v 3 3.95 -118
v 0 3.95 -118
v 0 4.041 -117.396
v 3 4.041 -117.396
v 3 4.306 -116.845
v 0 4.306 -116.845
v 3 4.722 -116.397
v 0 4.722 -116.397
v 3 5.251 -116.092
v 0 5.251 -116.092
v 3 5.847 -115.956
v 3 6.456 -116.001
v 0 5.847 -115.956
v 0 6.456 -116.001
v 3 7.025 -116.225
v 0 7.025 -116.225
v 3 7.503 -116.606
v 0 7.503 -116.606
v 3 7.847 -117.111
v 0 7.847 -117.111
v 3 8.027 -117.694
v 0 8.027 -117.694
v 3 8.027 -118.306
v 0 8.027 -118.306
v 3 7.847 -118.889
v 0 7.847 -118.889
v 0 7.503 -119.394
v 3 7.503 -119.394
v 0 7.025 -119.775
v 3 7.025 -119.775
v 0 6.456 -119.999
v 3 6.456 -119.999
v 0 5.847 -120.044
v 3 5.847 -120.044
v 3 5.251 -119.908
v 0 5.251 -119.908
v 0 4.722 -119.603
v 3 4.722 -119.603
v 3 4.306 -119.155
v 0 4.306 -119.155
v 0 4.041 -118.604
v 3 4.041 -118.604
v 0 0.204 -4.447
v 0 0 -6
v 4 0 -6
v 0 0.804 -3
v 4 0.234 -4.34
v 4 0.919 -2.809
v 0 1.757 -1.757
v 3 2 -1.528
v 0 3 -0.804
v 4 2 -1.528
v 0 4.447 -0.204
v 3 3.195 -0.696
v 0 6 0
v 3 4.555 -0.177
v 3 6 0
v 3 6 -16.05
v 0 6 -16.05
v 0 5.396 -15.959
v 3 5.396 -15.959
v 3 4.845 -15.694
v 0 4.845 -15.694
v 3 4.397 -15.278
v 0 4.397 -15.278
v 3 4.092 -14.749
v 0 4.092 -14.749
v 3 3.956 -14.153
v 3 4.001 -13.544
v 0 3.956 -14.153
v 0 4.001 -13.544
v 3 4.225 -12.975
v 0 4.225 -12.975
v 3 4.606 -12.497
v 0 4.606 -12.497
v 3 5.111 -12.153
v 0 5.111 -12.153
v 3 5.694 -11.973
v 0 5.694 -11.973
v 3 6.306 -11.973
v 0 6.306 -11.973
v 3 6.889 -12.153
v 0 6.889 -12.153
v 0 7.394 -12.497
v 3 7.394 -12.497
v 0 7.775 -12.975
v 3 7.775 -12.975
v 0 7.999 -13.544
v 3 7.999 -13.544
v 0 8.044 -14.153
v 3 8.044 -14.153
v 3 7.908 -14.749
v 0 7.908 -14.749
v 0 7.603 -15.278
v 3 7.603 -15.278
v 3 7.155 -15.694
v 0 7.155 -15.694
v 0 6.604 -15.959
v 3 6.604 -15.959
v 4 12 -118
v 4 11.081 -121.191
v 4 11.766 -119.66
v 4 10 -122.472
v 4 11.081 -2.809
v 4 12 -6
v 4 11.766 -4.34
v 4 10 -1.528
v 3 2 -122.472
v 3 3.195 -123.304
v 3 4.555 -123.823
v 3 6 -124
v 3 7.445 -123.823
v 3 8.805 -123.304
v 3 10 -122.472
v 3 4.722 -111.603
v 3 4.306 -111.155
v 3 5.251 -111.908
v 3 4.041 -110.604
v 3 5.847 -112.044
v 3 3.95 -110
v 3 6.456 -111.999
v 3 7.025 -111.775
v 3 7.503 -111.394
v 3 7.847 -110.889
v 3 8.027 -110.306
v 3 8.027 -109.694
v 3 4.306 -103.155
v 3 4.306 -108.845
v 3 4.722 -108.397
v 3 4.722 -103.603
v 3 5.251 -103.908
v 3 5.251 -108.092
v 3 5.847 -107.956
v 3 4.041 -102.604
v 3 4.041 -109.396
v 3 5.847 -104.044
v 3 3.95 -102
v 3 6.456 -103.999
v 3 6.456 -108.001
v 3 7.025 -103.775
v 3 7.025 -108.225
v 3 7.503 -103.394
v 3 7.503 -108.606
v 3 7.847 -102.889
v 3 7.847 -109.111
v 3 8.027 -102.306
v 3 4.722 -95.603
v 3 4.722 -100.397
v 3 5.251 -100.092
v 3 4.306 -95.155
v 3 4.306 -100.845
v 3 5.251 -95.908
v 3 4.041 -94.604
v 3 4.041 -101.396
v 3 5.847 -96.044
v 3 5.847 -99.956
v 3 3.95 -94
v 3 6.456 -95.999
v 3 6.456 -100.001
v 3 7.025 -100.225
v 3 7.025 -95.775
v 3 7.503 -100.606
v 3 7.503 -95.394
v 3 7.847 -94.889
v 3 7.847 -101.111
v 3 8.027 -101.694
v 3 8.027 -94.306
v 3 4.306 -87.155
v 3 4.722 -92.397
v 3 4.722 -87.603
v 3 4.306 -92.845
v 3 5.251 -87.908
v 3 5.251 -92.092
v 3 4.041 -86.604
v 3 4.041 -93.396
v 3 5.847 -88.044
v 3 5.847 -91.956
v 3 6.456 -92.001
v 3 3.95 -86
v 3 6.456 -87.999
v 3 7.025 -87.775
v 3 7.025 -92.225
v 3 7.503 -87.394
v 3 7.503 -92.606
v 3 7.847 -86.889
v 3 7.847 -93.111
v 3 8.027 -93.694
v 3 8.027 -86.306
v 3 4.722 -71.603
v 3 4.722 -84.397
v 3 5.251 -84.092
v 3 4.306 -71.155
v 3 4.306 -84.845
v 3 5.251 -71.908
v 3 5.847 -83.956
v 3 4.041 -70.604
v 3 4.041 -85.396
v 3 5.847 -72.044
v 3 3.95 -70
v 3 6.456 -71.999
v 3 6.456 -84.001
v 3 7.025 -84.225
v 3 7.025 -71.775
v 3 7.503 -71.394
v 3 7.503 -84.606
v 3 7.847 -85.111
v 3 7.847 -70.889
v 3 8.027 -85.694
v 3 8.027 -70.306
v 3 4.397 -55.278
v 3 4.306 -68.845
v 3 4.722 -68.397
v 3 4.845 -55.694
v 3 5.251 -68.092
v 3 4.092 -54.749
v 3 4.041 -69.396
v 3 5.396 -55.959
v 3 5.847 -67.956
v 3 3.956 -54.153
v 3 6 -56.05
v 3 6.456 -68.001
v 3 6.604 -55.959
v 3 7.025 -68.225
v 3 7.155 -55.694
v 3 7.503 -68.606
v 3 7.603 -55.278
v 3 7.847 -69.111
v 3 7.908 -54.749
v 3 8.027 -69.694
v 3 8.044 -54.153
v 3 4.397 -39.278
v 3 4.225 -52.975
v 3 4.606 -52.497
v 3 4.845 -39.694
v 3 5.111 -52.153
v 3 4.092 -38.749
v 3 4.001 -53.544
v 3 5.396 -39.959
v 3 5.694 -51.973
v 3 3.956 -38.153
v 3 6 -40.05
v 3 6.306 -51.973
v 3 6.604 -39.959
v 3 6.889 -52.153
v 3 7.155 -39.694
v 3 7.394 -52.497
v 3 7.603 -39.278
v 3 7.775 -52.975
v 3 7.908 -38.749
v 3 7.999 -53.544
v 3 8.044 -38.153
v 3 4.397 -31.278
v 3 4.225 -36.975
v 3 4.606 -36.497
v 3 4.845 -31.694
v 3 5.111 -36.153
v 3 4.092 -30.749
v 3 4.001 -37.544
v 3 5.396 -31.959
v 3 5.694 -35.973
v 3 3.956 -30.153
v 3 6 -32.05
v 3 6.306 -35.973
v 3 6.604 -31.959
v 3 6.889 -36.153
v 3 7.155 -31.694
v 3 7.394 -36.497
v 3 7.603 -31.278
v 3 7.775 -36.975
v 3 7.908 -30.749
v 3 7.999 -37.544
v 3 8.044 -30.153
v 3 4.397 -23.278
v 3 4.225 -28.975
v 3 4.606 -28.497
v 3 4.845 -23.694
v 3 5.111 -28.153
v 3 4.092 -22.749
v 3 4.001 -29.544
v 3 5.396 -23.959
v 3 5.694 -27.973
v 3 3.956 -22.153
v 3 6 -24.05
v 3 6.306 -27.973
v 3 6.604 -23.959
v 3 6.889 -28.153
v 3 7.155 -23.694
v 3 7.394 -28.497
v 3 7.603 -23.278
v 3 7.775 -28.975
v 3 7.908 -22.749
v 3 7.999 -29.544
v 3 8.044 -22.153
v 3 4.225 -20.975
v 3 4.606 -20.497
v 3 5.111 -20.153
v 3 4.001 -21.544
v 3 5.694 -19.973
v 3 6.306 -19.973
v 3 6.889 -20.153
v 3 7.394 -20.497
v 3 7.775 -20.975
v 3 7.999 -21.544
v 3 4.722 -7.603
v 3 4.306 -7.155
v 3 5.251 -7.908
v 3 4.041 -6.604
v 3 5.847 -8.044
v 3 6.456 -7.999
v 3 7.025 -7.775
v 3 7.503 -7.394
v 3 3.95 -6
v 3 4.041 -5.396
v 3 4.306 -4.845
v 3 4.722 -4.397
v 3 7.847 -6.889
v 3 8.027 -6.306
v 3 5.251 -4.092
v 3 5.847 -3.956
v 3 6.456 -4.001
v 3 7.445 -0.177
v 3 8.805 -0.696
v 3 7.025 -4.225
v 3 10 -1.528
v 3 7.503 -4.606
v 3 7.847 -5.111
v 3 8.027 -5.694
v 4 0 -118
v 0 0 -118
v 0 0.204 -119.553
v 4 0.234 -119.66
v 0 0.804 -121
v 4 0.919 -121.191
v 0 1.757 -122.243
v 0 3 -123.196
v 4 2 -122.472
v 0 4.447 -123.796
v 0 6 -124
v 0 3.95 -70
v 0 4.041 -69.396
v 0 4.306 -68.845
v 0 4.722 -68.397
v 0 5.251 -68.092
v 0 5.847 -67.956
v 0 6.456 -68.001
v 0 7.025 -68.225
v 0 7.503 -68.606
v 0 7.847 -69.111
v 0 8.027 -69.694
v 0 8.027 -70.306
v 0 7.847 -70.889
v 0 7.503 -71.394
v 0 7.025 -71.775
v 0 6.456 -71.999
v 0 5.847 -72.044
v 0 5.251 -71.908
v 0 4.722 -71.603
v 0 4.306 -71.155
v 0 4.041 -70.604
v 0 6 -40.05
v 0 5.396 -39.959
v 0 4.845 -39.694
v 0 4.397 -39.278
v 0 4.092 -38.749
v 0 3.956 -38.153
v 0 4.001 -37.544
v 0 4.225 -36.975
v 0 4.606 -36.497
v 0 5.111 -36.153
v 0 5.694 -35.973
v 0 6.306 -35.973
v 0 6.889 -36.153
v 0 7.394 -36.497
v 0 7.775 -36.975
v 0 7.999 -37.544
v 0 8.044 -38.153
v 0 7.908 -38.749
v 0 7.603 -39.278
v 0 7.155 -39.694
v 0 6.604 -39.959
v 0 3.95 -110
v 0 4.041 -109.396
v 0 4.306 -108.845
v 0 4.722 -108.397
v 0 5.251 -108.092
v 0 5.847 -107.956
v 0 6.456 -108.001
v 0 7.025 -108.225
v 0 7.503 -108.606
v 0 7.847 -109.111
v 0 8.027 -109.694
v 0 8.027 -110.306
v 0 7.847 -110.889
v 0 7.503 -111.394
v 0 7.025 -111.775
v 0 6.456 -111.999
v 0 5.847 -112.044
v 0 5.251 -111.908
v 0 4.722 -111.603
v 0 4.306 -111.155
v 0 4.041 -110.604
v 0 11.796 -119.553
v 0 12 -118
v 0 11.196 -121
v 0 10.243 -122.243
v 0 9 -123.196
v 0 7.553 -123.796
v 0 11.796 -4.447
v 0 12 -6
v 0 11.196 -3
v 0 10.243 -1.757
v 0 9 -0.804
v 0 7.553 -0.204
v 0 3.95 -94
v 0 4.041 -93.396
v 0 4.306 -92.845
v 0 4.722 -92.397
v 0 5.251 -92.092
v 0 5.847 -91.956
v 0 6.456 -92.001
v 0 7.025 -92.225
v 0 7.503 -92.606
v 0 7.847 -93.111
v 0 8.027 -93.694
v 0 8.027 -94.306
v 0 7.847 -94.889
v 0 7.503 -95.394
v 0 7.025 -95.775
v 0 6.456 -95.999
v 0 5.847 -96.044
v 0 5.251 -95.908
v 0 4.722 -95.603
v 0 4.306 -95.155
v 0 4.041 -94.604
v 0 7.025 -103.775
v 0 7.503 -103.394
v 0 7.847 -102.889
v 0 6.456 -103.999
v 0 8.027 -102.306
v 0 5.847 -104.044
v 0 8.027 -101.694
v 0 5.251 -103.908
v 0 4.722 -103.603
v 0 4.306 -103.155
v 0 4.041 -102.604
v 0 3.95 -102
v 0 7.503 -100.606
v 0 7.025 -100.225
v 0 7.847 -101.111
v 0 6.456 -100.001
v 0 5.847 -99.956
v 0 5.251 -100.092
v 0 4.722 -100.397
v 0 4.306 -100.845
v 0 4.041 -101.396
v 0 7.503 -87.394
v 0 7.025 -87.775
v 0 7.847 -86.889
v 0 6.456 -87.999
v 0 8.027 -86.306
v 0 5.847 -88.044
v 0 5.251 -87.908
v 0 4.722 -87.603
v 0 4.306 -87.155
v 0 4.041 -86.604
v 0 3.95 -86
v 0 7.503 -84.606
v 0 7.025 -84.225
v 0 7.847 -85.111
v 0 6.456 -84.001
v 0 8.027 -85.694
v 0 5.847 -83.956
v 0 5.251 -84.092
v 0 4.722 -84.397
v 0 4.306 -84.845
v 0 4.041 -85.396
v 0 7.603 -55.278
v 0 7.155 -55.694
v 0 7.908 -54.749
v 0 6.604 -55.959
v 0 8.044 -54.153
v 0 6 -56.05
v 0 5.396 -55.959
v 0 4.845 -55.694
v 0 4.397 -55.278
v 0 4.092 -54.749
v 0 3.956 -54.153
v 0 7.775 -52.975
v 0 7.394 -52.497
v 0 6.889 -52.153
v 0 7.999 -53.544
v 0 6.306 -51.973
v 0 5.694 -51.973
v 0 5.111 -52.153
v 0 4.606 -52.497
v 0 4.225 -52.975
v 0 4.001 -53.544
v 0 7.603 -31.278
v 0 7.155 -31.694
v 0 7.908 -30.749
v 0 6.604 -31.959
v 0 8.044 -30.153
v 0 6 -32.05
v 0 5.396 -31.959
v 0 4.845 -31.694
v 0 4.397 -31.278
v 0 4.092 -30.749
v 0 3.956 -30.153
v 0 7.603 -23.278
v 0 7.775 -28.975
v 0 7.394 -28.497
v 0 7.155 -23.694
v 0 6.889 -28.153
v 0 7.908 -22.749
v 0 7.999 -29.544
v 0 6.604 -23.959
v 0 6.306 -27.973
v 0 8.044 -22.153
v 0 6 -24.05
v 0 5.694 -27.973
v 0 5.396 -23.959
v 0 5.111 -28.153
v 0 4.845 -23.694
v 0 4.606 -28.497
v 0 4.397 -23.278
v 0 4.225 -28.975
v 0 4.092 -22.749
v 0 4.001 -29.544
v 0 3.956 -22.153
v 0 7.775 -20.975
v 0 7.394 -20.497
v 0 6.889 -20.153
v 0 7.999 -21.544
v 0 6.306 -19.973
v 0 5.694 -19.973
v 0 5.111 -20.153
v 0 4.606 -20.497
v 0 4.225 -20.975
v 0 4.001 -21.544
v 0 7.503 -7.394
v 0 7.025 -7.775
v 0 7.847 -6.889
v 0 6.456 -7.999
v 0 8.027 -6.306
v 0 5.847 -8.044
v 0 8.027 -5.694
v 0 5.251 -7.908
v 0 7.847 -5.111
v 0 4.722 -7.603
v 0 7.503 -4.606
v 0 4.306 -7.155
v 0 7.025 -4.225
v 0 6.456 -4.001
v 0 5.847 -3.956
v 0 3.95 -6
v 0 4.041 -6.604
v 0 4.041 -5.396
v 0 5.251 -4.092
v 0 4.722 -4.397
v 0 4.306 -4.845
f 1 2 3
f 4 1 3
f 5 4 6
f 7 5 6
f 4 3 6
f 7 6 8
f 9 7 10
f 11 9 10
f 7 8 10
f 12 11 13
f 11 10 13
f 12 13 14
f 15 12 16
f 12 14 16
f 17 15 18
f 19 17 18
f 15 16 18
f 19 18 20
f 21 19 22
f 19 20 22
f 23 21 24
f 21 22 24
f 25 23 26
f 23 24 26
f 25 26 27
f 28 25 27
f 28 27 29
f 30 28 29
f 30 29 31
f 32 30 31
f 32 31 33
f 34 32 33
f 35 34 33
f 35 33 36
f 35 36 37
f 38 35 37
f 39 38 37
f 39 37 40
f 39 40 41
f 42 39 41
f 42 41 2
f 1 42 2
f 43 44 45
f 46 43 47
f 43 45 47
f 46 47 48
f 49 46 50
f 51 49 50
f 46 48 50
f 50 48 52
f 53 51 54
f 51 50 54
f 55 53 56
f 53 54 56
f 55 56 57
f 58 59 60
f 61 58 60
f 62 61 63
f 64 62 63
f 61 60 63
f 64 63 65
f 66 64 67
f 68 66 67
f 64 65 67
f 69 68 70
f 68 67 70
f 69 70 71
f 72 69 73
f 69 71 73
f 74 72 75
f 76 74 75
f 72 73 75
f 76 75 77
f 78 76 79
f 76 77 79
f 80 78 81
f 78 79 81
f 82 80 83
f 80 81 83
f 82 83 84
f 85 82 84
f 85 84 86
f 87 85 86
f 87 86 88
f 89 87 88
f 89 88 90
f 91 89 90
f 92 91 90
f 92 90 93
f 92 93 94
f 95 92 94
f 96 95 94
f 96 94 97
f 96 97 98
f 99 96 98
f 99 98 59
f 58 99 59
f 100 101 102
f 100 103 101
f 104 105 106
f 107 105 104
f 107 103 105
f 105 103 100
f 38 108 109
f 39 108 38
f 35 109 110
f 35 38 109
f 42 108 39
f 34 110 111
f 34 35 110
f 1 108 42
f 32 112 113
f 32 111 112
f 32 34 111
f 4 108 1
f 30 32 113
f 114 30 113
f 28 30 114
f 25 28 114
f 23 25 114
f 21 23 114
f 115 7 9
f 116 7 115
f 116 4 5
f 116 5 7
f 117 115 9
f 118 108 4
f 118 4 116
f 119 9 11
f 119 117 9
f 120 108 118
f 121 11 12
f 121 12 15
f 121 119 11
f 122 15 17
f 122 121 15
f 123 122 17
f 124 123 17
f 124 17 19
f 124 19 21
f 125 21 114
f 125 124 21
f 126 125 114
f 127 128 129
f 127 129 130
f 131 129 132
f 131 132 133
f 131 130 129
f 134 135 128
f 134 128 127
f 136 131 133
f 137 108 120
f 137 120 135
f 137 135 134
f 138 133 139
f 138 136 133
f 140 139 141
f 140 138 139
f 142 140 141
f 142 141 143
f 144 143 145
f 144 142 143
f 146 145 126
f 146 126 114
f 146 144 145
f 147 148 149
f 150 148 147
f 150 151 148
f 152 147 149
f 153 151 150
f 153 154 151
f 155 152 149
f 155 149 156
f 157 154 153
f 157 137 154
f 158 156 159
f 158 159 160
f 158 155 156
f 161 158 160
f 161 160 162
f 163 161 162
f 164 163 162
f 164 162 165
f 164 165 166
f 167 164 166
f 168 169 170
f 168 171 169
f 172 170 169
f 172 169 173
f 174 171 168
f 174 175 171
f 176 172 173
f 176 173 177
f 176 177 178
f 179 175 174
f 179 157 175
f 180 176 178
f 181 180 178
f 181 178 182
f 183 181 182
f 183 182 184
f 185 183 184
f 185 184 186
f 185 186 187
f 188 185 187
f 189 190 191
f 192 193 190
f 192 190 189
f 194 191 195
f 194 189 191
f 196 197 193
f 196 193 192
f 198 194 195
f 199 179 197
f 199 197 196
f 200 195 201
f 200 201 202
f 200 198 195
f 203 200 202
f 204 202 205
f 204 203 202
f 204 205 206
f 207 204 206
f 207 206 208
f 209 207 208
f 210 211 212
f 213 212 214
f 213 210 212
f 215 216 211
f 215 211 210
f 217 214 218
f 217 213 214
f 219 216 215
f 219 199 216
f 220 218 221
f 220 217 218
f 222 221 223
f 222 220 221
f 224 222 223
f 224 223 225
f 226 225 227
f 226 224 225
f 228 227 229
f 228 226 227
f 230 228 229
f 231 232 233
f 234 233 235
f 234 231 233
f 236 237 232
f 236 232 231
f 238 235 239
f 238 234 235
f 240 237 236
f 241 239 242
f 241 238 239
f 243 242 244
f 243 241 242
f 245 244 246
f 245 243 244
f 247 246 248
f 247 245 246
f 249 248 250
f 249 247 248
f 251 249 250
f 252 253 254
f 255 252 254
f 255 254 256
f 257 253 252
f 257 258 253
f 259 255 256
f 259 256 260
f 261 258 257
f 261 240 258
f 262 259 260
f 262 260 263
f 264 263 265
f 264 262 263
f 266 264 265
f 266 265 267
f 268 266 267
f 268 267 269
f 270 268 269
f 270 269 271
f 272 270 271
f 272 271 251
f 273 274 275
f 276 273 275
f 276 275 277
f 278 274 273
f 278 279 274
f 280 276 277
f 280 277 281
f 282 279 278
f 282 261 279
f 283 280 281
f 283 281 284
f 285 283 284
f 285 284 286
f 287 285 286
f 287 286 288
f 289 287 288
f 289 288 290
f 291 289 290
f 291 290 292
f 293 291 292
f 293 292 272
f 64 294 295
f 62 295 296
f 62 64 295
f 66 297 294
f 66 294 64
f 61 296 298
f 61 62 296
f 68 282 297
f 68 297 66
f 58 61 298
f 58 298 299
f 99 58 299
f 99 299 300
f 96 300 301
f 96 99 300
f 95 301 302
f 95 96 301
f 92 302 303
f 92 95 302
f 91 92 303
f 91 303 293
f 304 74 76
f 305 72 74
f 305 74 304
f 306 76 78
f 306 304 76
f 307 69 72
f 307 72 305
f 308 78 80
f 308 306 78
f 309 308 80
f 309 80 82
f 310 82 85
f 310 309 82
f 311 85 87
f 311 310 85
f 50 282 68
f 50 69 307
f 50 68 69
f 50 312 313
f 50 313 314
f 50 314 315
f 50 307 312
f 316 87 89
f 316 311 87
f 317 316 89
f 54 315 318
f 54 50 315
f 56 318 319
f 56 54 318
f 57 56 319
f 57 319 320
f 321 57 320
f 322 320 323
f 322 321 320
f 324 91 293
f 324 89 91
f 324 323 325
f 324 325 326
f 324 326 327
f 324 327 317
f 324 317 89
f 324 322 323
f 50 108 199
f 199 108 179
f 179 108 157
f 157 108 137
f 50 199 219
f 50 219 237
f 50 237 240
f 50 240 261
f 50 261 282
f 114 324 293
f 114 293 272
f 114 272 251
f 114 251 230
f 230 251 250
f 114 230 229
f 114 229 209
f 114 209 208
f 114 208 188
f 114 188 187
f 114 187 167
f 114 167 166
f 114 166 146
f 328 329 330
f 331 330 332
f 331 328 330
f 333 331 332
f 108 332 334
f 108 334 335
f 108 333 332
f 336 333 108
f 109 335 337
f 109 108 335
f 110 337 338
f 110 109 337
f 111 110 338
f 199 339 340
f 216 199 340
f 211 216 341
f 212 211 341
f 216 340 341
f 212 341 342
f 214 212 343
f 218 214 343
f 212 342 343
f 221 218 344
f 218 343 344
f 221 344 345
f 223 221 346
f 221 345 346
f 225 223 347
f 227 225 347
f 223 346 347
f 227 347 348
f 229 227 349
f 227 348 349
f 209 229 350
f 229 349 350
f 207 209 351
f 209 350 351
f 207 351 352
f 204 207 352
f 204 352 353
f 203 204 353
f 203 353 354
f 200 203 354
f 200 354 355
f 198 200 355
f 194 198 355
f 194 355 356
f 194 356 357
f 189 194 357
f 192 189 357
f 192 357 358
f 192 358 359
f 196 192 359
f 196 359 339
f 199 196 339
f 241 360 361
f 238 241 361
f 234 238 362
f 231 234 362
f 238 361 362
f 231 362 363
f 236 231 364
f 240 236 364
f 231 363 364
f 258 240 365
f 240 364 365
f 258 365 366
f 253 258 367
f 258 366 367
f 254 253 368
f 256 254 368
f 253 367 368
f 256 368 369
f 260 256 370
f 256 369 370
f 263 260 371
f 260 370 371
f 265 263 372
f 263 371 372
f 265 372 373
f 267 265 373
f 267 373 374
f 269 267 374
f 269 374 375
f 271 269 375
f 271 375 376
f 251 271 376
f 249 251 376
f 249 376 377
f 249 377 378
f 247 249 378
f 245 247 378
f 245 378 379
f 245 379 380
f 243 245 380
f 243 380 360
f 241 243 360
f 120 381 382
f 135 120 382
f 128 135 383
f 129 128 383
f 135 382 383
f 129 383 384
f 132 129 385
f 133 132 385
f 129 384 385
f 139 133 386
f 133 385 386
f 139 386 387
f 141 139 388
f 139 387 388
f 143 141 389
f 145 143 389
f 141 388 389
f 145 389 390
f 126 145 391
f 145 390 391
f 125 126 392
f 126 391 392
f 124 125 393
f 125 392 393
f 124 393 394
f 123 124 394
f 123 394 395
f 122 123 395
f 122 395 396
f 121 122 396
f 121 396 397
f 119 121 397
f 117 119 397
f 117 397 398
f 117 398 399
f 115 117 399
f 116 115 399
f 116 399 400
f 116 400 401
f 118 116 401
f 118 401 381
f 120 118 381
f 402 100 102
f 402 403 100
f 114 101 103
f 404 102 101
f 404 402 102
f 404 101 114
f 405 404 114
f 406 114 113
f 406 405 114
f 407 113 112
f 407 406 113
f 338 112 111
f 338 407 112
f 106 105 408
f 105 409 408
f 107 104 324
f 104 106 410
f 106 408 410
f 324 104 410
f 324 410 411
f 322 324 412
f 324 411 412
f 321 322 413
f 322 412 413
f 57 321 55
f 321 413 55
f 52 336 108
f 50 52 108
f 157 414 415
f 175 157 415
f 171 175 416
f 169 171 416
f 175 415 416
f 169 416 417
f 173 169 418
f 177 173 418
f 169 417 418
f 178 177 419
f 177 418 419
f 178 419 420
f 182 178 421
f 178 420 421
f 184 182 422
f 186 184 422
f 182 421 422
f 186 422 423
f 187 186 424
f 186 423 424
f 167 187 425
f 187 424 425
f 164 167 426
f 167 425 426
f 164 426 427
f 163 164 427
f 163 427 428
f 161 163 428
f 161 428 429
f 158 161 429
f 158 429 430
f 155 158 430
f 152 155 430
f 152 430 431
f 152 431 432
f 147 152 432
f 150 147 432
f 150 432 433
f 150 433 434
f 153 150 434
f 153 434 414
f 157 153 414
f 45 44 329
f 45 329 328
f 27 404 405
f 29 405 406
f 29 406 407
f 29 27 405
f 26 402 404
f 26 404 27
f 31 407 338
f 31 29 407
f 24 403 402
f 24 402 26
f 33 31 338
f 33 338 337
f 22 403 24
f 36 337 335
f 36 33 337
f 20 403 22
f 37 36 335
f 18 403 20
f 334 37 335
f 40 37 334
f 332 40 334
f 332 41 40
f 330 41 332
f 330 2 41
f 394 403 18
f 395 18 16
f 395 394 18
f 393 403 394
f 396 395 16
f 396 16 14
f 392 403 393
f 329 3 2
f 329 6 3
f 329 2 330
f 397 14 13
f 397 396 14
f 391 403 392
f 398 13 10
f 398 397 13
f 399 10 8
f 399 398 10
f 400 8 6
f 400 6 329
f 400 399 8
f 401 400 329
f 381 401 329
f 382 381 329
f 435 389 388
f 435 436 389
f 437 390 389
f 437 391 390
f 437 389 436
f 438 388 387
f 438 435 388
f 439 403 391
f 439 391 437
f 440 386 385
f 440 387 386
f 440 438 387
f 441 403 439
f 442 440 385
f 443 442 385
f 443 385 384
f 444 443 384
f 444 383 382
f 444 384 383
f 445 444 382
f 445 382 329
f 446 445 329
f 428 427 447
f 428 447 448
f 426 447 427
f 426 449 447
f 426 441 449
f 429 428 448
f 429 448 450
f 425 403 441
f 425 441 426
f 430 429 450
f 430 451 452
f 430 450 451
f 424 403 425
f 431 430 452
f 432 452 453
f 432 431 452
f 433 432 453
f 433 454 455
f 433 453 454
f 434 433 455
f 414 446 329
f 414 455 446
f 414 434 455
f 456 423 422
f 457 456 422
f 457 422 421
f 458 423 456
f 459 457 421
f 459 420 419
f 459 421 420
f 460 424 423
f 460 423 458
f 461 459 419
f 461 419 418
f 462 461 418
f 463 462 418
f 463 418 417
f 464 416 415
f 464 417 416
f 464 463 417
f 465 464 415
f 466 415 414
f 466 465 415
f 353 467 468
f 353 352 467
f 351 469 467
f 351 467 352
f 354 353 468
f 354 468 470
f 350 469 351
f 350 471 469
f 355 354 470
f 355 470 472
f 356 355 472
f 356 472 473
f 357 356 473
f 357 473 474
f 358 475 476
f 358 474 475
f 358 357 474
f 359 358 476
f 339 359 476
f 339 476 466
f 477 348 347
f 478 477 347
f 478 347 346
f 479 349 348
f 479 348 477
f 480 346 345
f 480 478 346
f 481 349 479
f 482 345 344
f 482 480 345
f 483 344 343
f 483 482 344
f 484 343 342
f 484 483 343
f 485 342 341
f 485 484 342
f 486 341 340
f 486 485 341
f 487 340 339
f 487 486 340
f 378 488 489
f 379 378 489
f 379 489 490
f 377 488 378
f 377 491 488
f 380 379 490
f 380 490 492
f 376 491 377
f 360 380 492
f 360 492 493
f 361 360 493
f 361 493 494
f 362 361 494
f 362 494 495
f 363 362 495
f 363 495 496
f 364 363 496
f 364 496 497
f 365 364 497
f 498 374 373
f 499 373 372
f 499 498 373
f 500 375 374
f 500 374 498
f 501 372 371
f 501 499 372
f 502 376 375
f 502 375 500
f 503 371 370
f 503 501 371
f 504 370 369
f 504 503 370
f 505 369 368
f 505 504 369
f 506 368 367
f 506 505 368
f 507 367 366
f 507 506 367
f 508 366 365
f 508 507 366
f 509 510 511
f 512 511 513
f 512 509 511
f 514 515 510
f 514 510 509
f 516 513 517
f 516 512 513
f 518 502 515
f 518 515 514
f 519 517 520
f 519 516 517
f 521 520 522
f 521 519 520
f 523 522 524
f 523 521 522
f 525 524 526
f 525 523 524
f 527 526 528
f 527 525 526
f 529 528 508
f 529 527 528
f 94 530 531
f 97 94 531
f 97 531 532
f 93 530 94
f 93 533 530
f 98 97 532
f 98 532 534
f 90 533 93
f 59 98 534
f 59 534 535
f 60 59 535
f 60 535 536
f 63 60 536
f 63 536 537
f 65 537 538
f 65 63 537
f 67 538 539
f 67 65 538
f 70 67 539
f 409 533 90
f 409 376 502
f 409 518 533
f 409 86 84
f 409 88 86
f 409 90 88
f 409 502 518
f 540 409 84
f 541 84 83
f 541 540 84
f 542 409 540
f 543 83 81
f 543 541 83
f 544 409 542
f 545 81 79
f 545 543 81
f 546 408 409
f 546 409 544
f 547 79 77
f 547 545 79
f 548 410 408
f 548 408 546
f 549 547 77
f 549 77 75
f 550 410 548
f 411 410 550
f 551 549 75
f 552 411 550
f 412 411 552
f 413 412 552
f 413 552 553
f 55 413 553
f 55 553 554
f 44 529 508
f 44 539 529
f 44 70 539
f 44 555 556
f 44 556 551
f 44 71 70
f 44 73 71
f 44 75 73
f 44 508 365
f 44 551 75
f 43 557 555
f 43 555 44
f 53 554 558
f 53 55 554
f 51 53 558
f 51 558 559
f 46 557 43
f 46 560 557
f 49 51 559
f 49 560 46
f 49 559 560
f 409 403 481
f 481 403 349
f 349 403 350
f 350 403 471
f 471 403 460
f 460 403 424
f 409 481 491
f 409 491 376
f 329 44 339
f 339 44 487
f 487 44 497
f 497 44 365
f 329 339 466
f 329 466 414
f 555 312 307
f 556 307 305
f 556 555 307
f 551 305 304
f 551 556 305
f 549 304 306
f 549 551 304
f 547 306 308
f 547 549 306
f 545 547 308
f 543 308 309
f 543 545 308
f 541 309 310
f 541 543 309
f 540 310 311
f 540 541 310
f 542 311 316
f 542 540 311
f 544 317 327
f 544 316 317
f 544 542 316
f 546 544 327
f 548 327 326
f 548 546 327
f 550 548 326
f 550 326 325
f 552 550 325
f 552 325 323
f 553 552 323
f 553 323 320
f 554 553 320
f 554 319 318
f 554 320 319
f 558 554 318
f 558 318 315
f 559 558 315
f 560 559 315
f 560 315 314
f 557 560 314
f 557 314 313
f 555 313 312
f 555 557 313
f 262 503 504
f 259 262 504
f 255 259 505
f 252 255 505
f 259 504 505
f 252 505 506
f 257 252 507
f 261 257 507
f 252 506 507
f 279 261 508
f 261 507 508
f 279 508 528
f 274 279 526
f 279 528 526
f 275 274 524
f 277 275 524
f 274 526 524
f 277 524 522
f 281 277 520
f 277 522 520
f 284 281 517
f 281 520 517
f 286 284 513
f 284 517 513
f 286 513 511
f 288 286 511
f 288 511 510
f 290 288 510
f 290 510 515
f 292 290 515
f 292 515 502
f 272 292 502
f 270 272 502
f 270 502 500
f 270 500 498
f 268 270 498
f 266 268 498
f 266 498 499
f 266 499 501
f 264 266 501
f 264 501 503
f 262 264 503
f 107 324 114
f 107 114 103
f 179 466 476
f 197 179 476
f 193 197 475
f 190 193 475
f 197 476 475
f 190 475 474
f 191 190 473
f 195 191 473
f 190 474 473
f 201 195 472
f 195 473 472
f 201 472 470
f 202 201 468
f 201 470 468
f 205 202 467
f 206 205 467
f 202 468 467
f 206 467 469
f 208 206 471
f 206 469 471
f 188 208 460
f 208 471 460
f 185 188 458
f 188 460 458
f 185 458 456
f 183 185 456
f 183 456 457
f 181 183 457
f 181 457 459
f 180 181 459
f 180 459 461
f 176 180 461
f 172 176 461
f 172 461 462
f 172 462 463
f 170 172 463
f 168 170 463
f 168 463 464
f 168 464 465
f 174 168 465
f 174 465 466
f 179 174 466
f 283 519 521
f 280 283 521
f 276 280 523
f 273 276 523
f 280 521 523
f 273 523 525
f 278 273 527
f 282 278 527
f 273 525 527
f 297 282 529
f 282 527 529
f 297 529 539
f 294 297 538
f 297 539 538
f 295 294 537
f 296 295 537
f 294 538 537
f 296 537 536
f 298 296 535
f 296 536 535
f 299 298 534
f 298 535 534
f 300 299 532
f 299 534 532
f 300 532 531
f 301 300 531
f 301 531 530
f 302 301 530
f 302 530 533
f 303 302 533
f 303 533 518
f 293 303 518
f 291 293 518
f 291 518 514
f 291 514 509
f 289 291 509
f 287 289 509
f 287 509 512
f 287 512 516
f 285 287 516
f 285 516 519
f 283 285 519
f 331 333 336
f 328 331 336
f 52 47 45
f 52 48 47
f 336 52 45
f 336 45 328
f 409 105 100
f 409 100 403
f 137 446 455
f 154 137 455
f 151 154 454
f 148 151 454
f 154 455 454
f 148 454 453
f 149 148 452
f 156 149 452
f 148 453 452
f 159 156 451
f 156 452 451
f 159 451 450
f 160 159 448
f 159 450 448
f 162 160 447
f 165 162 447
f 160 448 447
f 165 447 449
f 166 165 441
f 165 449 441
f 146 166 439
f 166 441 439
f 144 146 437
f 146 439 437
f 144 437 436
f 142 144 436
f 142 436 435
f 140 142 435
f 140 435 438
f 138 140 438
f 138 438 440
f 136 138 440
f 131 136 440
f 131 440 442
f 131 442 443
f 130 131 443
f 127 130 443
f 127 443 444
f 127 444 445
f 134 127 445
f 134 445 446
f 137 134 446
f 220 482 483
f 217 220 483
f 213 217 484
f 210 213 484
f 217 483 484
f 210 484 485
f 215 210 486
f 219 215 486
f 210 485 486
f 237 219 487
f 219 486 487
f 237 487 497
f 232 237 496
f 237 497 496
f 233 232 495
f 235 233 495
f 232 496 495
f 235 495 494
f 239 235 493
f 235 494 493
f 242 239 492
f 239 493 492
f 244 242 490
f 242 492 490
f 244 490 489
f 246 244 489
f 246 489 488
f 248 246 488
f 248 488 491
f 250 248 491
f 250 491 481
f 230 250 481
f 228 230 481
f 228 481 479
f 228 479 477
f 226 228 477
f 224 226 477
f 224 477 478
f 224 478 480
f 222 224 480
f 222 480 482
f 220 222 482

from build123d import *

# Parameters (mm, degrees)
BOSS_EXTRUDE1_DEPTH     = 124
FILLET1_R               = 6
SKETCH2_R               = 2.05
CUT_EXTRUDE1_DEPTH      = 125.643491607
LPATTERN1_COUNT         = 7
LPATTERN1_PITCH         = 8
MIRROR1_COPY_1_SKETCH_R = 2.05
MIRROR1_COPY_1_DEPTH    = 125.643491607
MIRROR1_COPY_2_SKETCH_R = 2.05
MIRROR1_COPY_2_DEPTH    = 125.643491607
MIRROR1_COPY_3_SKETCH_R = 2.05
MIRROR1_COPY_3_DEPTH    = 125.643491607
MIRROR1_COPY_4_SKETCH_R = 2.05
MIRROR1_COPY_4_DEPTH    = 125.643491607
MIRROR1_COPY_5_SKETCH_R = 2.05
MIRROR1_COPY_5_DEPTH    = 125.643491607


with BuildPart() as part:
    # Sketch1 → Boss-Extrude1 (new body)
    with BuildSketch(Plane.XY):
        Polygon((0, 0), (4, 0), (4, 2), (3, 2), (3, 10), (4, 10), (4, 12), (0, 12), align=None)
    extrude(amount=-BOSS_EXTRUDE1_DEPTH)

    # Fillet1
    fillet1_edges = [part.edges().sort_by_distance(p)[0] for p in [
        (2, 12, 0),
        (2, 0, 0),
        (2, 0, -124),
        (2, 12, -124),
    ]]
    fillet(fillet1_edges, radius=FILLET1_R - 0.0001)  # a hair under: the kernel refuses the full size

    # Sketch2 → Cut-Extrude1 (cut, through all)
    with BuildSketch(Plane.ZY):
        with Locations(Location((-118, 6, 0), (0, 0, 270))):
            Circle(SKETCH2_R)
    cut_extrude1 = extrude(amount=-CUT_EXTRUDE1_DEPTH, mode=Mode.SUBTRACT)

    # LPattern1: Cut-Extrude1 ×7, 1 skipped
    with Locations(*[(0, 0, i * LPATTERN1_PITCH) for i in range(1, LPATTERN1_COUNT) if i not in (5,)]):
        add(cut_extrude1, mode=Mode.SUBTRACT)

    # Mirror1: Cut-Extrude1 across plane
    add(cut_extrude1.mirror(Plane.XY.offset(-62)), mode=Mode.SUBTRACT)

    # Mirror1 copy 1 sketch → Mirror1 copy 1 (cut, through all)
    with BuildSketch(Plane(origin=(0, 0, -132), x_dir=(0, 0, -1), z_dir=(-1, 0, 0))):
        with Locations((-118, -6)):
            Circle(MIRROR1_COPY_1_SKETCH_R)
    extrude(amount=-MIRROR1_COPY_1_DEPTH, mode=Mode.SUBTRACT)

    # Mirror1 copy 2 sketch → Mirror1 copy 2 (cut, through all)
    with BuildSketch(Plane(origin=(0, 0, -140), x_dir=(0, 0, -1), z_dir=(-1, 0, 0))):
        with Locations((-118, -6)):
            Circle(MIRROR1_COPY_2_SKETCH_R)
    extrude(amount=-MIRROR1_COPY_2_DEPTH, mode=Mode.SUBTRACT)

    # Mirror1 copy 3 sketch → Mirror1 copy 3 (cut, through all)
    with BuildSketch(Plane(origin=(0, 0, -148), x_dir=(0, 0, -1), z_dir=(-1, 0, 0))):
        with Locations((-118, -6)):
            Circle(MIRROR1_COPY_3_SKETCH_R)
    extrude(amount=-MIRROR1_COPY_3_DEPTH, mode=Mode.SUBTRACT)

    # Mirror1 copy 4 sketch → Mirror1 copy 4 (cut, through all)
    with BuildSketch(Plane(origin=(0, 0, -156), x_dir=(0, 0, -1), z_dir=(-1, 0, 0))):
        with Locations((-118, -6)):
            Circle(MIRROR1_COPY_4_SKETCH_R)
    extrude(amount=-MIRROR1_COPY_4_DEPTH, mode=Mode.SUBTRACT)

    # Mirror1 copy 5 sketch → Mirror1 copy 5 (cut, through all)
    with BuildSketch(Plane(origin=(0, 0, -172), x_dir=(0, 0, -1), z_dir=(-1, 0, 0))):
        with Locations((-118, -6)):
            Circle(MIRROR1_COPY_5_SKETCH_R)
    extrude(amount=-MIRROR1_COPY_5_DEPTH, mode=Mode.SUBTRACT)


solid = part.part
